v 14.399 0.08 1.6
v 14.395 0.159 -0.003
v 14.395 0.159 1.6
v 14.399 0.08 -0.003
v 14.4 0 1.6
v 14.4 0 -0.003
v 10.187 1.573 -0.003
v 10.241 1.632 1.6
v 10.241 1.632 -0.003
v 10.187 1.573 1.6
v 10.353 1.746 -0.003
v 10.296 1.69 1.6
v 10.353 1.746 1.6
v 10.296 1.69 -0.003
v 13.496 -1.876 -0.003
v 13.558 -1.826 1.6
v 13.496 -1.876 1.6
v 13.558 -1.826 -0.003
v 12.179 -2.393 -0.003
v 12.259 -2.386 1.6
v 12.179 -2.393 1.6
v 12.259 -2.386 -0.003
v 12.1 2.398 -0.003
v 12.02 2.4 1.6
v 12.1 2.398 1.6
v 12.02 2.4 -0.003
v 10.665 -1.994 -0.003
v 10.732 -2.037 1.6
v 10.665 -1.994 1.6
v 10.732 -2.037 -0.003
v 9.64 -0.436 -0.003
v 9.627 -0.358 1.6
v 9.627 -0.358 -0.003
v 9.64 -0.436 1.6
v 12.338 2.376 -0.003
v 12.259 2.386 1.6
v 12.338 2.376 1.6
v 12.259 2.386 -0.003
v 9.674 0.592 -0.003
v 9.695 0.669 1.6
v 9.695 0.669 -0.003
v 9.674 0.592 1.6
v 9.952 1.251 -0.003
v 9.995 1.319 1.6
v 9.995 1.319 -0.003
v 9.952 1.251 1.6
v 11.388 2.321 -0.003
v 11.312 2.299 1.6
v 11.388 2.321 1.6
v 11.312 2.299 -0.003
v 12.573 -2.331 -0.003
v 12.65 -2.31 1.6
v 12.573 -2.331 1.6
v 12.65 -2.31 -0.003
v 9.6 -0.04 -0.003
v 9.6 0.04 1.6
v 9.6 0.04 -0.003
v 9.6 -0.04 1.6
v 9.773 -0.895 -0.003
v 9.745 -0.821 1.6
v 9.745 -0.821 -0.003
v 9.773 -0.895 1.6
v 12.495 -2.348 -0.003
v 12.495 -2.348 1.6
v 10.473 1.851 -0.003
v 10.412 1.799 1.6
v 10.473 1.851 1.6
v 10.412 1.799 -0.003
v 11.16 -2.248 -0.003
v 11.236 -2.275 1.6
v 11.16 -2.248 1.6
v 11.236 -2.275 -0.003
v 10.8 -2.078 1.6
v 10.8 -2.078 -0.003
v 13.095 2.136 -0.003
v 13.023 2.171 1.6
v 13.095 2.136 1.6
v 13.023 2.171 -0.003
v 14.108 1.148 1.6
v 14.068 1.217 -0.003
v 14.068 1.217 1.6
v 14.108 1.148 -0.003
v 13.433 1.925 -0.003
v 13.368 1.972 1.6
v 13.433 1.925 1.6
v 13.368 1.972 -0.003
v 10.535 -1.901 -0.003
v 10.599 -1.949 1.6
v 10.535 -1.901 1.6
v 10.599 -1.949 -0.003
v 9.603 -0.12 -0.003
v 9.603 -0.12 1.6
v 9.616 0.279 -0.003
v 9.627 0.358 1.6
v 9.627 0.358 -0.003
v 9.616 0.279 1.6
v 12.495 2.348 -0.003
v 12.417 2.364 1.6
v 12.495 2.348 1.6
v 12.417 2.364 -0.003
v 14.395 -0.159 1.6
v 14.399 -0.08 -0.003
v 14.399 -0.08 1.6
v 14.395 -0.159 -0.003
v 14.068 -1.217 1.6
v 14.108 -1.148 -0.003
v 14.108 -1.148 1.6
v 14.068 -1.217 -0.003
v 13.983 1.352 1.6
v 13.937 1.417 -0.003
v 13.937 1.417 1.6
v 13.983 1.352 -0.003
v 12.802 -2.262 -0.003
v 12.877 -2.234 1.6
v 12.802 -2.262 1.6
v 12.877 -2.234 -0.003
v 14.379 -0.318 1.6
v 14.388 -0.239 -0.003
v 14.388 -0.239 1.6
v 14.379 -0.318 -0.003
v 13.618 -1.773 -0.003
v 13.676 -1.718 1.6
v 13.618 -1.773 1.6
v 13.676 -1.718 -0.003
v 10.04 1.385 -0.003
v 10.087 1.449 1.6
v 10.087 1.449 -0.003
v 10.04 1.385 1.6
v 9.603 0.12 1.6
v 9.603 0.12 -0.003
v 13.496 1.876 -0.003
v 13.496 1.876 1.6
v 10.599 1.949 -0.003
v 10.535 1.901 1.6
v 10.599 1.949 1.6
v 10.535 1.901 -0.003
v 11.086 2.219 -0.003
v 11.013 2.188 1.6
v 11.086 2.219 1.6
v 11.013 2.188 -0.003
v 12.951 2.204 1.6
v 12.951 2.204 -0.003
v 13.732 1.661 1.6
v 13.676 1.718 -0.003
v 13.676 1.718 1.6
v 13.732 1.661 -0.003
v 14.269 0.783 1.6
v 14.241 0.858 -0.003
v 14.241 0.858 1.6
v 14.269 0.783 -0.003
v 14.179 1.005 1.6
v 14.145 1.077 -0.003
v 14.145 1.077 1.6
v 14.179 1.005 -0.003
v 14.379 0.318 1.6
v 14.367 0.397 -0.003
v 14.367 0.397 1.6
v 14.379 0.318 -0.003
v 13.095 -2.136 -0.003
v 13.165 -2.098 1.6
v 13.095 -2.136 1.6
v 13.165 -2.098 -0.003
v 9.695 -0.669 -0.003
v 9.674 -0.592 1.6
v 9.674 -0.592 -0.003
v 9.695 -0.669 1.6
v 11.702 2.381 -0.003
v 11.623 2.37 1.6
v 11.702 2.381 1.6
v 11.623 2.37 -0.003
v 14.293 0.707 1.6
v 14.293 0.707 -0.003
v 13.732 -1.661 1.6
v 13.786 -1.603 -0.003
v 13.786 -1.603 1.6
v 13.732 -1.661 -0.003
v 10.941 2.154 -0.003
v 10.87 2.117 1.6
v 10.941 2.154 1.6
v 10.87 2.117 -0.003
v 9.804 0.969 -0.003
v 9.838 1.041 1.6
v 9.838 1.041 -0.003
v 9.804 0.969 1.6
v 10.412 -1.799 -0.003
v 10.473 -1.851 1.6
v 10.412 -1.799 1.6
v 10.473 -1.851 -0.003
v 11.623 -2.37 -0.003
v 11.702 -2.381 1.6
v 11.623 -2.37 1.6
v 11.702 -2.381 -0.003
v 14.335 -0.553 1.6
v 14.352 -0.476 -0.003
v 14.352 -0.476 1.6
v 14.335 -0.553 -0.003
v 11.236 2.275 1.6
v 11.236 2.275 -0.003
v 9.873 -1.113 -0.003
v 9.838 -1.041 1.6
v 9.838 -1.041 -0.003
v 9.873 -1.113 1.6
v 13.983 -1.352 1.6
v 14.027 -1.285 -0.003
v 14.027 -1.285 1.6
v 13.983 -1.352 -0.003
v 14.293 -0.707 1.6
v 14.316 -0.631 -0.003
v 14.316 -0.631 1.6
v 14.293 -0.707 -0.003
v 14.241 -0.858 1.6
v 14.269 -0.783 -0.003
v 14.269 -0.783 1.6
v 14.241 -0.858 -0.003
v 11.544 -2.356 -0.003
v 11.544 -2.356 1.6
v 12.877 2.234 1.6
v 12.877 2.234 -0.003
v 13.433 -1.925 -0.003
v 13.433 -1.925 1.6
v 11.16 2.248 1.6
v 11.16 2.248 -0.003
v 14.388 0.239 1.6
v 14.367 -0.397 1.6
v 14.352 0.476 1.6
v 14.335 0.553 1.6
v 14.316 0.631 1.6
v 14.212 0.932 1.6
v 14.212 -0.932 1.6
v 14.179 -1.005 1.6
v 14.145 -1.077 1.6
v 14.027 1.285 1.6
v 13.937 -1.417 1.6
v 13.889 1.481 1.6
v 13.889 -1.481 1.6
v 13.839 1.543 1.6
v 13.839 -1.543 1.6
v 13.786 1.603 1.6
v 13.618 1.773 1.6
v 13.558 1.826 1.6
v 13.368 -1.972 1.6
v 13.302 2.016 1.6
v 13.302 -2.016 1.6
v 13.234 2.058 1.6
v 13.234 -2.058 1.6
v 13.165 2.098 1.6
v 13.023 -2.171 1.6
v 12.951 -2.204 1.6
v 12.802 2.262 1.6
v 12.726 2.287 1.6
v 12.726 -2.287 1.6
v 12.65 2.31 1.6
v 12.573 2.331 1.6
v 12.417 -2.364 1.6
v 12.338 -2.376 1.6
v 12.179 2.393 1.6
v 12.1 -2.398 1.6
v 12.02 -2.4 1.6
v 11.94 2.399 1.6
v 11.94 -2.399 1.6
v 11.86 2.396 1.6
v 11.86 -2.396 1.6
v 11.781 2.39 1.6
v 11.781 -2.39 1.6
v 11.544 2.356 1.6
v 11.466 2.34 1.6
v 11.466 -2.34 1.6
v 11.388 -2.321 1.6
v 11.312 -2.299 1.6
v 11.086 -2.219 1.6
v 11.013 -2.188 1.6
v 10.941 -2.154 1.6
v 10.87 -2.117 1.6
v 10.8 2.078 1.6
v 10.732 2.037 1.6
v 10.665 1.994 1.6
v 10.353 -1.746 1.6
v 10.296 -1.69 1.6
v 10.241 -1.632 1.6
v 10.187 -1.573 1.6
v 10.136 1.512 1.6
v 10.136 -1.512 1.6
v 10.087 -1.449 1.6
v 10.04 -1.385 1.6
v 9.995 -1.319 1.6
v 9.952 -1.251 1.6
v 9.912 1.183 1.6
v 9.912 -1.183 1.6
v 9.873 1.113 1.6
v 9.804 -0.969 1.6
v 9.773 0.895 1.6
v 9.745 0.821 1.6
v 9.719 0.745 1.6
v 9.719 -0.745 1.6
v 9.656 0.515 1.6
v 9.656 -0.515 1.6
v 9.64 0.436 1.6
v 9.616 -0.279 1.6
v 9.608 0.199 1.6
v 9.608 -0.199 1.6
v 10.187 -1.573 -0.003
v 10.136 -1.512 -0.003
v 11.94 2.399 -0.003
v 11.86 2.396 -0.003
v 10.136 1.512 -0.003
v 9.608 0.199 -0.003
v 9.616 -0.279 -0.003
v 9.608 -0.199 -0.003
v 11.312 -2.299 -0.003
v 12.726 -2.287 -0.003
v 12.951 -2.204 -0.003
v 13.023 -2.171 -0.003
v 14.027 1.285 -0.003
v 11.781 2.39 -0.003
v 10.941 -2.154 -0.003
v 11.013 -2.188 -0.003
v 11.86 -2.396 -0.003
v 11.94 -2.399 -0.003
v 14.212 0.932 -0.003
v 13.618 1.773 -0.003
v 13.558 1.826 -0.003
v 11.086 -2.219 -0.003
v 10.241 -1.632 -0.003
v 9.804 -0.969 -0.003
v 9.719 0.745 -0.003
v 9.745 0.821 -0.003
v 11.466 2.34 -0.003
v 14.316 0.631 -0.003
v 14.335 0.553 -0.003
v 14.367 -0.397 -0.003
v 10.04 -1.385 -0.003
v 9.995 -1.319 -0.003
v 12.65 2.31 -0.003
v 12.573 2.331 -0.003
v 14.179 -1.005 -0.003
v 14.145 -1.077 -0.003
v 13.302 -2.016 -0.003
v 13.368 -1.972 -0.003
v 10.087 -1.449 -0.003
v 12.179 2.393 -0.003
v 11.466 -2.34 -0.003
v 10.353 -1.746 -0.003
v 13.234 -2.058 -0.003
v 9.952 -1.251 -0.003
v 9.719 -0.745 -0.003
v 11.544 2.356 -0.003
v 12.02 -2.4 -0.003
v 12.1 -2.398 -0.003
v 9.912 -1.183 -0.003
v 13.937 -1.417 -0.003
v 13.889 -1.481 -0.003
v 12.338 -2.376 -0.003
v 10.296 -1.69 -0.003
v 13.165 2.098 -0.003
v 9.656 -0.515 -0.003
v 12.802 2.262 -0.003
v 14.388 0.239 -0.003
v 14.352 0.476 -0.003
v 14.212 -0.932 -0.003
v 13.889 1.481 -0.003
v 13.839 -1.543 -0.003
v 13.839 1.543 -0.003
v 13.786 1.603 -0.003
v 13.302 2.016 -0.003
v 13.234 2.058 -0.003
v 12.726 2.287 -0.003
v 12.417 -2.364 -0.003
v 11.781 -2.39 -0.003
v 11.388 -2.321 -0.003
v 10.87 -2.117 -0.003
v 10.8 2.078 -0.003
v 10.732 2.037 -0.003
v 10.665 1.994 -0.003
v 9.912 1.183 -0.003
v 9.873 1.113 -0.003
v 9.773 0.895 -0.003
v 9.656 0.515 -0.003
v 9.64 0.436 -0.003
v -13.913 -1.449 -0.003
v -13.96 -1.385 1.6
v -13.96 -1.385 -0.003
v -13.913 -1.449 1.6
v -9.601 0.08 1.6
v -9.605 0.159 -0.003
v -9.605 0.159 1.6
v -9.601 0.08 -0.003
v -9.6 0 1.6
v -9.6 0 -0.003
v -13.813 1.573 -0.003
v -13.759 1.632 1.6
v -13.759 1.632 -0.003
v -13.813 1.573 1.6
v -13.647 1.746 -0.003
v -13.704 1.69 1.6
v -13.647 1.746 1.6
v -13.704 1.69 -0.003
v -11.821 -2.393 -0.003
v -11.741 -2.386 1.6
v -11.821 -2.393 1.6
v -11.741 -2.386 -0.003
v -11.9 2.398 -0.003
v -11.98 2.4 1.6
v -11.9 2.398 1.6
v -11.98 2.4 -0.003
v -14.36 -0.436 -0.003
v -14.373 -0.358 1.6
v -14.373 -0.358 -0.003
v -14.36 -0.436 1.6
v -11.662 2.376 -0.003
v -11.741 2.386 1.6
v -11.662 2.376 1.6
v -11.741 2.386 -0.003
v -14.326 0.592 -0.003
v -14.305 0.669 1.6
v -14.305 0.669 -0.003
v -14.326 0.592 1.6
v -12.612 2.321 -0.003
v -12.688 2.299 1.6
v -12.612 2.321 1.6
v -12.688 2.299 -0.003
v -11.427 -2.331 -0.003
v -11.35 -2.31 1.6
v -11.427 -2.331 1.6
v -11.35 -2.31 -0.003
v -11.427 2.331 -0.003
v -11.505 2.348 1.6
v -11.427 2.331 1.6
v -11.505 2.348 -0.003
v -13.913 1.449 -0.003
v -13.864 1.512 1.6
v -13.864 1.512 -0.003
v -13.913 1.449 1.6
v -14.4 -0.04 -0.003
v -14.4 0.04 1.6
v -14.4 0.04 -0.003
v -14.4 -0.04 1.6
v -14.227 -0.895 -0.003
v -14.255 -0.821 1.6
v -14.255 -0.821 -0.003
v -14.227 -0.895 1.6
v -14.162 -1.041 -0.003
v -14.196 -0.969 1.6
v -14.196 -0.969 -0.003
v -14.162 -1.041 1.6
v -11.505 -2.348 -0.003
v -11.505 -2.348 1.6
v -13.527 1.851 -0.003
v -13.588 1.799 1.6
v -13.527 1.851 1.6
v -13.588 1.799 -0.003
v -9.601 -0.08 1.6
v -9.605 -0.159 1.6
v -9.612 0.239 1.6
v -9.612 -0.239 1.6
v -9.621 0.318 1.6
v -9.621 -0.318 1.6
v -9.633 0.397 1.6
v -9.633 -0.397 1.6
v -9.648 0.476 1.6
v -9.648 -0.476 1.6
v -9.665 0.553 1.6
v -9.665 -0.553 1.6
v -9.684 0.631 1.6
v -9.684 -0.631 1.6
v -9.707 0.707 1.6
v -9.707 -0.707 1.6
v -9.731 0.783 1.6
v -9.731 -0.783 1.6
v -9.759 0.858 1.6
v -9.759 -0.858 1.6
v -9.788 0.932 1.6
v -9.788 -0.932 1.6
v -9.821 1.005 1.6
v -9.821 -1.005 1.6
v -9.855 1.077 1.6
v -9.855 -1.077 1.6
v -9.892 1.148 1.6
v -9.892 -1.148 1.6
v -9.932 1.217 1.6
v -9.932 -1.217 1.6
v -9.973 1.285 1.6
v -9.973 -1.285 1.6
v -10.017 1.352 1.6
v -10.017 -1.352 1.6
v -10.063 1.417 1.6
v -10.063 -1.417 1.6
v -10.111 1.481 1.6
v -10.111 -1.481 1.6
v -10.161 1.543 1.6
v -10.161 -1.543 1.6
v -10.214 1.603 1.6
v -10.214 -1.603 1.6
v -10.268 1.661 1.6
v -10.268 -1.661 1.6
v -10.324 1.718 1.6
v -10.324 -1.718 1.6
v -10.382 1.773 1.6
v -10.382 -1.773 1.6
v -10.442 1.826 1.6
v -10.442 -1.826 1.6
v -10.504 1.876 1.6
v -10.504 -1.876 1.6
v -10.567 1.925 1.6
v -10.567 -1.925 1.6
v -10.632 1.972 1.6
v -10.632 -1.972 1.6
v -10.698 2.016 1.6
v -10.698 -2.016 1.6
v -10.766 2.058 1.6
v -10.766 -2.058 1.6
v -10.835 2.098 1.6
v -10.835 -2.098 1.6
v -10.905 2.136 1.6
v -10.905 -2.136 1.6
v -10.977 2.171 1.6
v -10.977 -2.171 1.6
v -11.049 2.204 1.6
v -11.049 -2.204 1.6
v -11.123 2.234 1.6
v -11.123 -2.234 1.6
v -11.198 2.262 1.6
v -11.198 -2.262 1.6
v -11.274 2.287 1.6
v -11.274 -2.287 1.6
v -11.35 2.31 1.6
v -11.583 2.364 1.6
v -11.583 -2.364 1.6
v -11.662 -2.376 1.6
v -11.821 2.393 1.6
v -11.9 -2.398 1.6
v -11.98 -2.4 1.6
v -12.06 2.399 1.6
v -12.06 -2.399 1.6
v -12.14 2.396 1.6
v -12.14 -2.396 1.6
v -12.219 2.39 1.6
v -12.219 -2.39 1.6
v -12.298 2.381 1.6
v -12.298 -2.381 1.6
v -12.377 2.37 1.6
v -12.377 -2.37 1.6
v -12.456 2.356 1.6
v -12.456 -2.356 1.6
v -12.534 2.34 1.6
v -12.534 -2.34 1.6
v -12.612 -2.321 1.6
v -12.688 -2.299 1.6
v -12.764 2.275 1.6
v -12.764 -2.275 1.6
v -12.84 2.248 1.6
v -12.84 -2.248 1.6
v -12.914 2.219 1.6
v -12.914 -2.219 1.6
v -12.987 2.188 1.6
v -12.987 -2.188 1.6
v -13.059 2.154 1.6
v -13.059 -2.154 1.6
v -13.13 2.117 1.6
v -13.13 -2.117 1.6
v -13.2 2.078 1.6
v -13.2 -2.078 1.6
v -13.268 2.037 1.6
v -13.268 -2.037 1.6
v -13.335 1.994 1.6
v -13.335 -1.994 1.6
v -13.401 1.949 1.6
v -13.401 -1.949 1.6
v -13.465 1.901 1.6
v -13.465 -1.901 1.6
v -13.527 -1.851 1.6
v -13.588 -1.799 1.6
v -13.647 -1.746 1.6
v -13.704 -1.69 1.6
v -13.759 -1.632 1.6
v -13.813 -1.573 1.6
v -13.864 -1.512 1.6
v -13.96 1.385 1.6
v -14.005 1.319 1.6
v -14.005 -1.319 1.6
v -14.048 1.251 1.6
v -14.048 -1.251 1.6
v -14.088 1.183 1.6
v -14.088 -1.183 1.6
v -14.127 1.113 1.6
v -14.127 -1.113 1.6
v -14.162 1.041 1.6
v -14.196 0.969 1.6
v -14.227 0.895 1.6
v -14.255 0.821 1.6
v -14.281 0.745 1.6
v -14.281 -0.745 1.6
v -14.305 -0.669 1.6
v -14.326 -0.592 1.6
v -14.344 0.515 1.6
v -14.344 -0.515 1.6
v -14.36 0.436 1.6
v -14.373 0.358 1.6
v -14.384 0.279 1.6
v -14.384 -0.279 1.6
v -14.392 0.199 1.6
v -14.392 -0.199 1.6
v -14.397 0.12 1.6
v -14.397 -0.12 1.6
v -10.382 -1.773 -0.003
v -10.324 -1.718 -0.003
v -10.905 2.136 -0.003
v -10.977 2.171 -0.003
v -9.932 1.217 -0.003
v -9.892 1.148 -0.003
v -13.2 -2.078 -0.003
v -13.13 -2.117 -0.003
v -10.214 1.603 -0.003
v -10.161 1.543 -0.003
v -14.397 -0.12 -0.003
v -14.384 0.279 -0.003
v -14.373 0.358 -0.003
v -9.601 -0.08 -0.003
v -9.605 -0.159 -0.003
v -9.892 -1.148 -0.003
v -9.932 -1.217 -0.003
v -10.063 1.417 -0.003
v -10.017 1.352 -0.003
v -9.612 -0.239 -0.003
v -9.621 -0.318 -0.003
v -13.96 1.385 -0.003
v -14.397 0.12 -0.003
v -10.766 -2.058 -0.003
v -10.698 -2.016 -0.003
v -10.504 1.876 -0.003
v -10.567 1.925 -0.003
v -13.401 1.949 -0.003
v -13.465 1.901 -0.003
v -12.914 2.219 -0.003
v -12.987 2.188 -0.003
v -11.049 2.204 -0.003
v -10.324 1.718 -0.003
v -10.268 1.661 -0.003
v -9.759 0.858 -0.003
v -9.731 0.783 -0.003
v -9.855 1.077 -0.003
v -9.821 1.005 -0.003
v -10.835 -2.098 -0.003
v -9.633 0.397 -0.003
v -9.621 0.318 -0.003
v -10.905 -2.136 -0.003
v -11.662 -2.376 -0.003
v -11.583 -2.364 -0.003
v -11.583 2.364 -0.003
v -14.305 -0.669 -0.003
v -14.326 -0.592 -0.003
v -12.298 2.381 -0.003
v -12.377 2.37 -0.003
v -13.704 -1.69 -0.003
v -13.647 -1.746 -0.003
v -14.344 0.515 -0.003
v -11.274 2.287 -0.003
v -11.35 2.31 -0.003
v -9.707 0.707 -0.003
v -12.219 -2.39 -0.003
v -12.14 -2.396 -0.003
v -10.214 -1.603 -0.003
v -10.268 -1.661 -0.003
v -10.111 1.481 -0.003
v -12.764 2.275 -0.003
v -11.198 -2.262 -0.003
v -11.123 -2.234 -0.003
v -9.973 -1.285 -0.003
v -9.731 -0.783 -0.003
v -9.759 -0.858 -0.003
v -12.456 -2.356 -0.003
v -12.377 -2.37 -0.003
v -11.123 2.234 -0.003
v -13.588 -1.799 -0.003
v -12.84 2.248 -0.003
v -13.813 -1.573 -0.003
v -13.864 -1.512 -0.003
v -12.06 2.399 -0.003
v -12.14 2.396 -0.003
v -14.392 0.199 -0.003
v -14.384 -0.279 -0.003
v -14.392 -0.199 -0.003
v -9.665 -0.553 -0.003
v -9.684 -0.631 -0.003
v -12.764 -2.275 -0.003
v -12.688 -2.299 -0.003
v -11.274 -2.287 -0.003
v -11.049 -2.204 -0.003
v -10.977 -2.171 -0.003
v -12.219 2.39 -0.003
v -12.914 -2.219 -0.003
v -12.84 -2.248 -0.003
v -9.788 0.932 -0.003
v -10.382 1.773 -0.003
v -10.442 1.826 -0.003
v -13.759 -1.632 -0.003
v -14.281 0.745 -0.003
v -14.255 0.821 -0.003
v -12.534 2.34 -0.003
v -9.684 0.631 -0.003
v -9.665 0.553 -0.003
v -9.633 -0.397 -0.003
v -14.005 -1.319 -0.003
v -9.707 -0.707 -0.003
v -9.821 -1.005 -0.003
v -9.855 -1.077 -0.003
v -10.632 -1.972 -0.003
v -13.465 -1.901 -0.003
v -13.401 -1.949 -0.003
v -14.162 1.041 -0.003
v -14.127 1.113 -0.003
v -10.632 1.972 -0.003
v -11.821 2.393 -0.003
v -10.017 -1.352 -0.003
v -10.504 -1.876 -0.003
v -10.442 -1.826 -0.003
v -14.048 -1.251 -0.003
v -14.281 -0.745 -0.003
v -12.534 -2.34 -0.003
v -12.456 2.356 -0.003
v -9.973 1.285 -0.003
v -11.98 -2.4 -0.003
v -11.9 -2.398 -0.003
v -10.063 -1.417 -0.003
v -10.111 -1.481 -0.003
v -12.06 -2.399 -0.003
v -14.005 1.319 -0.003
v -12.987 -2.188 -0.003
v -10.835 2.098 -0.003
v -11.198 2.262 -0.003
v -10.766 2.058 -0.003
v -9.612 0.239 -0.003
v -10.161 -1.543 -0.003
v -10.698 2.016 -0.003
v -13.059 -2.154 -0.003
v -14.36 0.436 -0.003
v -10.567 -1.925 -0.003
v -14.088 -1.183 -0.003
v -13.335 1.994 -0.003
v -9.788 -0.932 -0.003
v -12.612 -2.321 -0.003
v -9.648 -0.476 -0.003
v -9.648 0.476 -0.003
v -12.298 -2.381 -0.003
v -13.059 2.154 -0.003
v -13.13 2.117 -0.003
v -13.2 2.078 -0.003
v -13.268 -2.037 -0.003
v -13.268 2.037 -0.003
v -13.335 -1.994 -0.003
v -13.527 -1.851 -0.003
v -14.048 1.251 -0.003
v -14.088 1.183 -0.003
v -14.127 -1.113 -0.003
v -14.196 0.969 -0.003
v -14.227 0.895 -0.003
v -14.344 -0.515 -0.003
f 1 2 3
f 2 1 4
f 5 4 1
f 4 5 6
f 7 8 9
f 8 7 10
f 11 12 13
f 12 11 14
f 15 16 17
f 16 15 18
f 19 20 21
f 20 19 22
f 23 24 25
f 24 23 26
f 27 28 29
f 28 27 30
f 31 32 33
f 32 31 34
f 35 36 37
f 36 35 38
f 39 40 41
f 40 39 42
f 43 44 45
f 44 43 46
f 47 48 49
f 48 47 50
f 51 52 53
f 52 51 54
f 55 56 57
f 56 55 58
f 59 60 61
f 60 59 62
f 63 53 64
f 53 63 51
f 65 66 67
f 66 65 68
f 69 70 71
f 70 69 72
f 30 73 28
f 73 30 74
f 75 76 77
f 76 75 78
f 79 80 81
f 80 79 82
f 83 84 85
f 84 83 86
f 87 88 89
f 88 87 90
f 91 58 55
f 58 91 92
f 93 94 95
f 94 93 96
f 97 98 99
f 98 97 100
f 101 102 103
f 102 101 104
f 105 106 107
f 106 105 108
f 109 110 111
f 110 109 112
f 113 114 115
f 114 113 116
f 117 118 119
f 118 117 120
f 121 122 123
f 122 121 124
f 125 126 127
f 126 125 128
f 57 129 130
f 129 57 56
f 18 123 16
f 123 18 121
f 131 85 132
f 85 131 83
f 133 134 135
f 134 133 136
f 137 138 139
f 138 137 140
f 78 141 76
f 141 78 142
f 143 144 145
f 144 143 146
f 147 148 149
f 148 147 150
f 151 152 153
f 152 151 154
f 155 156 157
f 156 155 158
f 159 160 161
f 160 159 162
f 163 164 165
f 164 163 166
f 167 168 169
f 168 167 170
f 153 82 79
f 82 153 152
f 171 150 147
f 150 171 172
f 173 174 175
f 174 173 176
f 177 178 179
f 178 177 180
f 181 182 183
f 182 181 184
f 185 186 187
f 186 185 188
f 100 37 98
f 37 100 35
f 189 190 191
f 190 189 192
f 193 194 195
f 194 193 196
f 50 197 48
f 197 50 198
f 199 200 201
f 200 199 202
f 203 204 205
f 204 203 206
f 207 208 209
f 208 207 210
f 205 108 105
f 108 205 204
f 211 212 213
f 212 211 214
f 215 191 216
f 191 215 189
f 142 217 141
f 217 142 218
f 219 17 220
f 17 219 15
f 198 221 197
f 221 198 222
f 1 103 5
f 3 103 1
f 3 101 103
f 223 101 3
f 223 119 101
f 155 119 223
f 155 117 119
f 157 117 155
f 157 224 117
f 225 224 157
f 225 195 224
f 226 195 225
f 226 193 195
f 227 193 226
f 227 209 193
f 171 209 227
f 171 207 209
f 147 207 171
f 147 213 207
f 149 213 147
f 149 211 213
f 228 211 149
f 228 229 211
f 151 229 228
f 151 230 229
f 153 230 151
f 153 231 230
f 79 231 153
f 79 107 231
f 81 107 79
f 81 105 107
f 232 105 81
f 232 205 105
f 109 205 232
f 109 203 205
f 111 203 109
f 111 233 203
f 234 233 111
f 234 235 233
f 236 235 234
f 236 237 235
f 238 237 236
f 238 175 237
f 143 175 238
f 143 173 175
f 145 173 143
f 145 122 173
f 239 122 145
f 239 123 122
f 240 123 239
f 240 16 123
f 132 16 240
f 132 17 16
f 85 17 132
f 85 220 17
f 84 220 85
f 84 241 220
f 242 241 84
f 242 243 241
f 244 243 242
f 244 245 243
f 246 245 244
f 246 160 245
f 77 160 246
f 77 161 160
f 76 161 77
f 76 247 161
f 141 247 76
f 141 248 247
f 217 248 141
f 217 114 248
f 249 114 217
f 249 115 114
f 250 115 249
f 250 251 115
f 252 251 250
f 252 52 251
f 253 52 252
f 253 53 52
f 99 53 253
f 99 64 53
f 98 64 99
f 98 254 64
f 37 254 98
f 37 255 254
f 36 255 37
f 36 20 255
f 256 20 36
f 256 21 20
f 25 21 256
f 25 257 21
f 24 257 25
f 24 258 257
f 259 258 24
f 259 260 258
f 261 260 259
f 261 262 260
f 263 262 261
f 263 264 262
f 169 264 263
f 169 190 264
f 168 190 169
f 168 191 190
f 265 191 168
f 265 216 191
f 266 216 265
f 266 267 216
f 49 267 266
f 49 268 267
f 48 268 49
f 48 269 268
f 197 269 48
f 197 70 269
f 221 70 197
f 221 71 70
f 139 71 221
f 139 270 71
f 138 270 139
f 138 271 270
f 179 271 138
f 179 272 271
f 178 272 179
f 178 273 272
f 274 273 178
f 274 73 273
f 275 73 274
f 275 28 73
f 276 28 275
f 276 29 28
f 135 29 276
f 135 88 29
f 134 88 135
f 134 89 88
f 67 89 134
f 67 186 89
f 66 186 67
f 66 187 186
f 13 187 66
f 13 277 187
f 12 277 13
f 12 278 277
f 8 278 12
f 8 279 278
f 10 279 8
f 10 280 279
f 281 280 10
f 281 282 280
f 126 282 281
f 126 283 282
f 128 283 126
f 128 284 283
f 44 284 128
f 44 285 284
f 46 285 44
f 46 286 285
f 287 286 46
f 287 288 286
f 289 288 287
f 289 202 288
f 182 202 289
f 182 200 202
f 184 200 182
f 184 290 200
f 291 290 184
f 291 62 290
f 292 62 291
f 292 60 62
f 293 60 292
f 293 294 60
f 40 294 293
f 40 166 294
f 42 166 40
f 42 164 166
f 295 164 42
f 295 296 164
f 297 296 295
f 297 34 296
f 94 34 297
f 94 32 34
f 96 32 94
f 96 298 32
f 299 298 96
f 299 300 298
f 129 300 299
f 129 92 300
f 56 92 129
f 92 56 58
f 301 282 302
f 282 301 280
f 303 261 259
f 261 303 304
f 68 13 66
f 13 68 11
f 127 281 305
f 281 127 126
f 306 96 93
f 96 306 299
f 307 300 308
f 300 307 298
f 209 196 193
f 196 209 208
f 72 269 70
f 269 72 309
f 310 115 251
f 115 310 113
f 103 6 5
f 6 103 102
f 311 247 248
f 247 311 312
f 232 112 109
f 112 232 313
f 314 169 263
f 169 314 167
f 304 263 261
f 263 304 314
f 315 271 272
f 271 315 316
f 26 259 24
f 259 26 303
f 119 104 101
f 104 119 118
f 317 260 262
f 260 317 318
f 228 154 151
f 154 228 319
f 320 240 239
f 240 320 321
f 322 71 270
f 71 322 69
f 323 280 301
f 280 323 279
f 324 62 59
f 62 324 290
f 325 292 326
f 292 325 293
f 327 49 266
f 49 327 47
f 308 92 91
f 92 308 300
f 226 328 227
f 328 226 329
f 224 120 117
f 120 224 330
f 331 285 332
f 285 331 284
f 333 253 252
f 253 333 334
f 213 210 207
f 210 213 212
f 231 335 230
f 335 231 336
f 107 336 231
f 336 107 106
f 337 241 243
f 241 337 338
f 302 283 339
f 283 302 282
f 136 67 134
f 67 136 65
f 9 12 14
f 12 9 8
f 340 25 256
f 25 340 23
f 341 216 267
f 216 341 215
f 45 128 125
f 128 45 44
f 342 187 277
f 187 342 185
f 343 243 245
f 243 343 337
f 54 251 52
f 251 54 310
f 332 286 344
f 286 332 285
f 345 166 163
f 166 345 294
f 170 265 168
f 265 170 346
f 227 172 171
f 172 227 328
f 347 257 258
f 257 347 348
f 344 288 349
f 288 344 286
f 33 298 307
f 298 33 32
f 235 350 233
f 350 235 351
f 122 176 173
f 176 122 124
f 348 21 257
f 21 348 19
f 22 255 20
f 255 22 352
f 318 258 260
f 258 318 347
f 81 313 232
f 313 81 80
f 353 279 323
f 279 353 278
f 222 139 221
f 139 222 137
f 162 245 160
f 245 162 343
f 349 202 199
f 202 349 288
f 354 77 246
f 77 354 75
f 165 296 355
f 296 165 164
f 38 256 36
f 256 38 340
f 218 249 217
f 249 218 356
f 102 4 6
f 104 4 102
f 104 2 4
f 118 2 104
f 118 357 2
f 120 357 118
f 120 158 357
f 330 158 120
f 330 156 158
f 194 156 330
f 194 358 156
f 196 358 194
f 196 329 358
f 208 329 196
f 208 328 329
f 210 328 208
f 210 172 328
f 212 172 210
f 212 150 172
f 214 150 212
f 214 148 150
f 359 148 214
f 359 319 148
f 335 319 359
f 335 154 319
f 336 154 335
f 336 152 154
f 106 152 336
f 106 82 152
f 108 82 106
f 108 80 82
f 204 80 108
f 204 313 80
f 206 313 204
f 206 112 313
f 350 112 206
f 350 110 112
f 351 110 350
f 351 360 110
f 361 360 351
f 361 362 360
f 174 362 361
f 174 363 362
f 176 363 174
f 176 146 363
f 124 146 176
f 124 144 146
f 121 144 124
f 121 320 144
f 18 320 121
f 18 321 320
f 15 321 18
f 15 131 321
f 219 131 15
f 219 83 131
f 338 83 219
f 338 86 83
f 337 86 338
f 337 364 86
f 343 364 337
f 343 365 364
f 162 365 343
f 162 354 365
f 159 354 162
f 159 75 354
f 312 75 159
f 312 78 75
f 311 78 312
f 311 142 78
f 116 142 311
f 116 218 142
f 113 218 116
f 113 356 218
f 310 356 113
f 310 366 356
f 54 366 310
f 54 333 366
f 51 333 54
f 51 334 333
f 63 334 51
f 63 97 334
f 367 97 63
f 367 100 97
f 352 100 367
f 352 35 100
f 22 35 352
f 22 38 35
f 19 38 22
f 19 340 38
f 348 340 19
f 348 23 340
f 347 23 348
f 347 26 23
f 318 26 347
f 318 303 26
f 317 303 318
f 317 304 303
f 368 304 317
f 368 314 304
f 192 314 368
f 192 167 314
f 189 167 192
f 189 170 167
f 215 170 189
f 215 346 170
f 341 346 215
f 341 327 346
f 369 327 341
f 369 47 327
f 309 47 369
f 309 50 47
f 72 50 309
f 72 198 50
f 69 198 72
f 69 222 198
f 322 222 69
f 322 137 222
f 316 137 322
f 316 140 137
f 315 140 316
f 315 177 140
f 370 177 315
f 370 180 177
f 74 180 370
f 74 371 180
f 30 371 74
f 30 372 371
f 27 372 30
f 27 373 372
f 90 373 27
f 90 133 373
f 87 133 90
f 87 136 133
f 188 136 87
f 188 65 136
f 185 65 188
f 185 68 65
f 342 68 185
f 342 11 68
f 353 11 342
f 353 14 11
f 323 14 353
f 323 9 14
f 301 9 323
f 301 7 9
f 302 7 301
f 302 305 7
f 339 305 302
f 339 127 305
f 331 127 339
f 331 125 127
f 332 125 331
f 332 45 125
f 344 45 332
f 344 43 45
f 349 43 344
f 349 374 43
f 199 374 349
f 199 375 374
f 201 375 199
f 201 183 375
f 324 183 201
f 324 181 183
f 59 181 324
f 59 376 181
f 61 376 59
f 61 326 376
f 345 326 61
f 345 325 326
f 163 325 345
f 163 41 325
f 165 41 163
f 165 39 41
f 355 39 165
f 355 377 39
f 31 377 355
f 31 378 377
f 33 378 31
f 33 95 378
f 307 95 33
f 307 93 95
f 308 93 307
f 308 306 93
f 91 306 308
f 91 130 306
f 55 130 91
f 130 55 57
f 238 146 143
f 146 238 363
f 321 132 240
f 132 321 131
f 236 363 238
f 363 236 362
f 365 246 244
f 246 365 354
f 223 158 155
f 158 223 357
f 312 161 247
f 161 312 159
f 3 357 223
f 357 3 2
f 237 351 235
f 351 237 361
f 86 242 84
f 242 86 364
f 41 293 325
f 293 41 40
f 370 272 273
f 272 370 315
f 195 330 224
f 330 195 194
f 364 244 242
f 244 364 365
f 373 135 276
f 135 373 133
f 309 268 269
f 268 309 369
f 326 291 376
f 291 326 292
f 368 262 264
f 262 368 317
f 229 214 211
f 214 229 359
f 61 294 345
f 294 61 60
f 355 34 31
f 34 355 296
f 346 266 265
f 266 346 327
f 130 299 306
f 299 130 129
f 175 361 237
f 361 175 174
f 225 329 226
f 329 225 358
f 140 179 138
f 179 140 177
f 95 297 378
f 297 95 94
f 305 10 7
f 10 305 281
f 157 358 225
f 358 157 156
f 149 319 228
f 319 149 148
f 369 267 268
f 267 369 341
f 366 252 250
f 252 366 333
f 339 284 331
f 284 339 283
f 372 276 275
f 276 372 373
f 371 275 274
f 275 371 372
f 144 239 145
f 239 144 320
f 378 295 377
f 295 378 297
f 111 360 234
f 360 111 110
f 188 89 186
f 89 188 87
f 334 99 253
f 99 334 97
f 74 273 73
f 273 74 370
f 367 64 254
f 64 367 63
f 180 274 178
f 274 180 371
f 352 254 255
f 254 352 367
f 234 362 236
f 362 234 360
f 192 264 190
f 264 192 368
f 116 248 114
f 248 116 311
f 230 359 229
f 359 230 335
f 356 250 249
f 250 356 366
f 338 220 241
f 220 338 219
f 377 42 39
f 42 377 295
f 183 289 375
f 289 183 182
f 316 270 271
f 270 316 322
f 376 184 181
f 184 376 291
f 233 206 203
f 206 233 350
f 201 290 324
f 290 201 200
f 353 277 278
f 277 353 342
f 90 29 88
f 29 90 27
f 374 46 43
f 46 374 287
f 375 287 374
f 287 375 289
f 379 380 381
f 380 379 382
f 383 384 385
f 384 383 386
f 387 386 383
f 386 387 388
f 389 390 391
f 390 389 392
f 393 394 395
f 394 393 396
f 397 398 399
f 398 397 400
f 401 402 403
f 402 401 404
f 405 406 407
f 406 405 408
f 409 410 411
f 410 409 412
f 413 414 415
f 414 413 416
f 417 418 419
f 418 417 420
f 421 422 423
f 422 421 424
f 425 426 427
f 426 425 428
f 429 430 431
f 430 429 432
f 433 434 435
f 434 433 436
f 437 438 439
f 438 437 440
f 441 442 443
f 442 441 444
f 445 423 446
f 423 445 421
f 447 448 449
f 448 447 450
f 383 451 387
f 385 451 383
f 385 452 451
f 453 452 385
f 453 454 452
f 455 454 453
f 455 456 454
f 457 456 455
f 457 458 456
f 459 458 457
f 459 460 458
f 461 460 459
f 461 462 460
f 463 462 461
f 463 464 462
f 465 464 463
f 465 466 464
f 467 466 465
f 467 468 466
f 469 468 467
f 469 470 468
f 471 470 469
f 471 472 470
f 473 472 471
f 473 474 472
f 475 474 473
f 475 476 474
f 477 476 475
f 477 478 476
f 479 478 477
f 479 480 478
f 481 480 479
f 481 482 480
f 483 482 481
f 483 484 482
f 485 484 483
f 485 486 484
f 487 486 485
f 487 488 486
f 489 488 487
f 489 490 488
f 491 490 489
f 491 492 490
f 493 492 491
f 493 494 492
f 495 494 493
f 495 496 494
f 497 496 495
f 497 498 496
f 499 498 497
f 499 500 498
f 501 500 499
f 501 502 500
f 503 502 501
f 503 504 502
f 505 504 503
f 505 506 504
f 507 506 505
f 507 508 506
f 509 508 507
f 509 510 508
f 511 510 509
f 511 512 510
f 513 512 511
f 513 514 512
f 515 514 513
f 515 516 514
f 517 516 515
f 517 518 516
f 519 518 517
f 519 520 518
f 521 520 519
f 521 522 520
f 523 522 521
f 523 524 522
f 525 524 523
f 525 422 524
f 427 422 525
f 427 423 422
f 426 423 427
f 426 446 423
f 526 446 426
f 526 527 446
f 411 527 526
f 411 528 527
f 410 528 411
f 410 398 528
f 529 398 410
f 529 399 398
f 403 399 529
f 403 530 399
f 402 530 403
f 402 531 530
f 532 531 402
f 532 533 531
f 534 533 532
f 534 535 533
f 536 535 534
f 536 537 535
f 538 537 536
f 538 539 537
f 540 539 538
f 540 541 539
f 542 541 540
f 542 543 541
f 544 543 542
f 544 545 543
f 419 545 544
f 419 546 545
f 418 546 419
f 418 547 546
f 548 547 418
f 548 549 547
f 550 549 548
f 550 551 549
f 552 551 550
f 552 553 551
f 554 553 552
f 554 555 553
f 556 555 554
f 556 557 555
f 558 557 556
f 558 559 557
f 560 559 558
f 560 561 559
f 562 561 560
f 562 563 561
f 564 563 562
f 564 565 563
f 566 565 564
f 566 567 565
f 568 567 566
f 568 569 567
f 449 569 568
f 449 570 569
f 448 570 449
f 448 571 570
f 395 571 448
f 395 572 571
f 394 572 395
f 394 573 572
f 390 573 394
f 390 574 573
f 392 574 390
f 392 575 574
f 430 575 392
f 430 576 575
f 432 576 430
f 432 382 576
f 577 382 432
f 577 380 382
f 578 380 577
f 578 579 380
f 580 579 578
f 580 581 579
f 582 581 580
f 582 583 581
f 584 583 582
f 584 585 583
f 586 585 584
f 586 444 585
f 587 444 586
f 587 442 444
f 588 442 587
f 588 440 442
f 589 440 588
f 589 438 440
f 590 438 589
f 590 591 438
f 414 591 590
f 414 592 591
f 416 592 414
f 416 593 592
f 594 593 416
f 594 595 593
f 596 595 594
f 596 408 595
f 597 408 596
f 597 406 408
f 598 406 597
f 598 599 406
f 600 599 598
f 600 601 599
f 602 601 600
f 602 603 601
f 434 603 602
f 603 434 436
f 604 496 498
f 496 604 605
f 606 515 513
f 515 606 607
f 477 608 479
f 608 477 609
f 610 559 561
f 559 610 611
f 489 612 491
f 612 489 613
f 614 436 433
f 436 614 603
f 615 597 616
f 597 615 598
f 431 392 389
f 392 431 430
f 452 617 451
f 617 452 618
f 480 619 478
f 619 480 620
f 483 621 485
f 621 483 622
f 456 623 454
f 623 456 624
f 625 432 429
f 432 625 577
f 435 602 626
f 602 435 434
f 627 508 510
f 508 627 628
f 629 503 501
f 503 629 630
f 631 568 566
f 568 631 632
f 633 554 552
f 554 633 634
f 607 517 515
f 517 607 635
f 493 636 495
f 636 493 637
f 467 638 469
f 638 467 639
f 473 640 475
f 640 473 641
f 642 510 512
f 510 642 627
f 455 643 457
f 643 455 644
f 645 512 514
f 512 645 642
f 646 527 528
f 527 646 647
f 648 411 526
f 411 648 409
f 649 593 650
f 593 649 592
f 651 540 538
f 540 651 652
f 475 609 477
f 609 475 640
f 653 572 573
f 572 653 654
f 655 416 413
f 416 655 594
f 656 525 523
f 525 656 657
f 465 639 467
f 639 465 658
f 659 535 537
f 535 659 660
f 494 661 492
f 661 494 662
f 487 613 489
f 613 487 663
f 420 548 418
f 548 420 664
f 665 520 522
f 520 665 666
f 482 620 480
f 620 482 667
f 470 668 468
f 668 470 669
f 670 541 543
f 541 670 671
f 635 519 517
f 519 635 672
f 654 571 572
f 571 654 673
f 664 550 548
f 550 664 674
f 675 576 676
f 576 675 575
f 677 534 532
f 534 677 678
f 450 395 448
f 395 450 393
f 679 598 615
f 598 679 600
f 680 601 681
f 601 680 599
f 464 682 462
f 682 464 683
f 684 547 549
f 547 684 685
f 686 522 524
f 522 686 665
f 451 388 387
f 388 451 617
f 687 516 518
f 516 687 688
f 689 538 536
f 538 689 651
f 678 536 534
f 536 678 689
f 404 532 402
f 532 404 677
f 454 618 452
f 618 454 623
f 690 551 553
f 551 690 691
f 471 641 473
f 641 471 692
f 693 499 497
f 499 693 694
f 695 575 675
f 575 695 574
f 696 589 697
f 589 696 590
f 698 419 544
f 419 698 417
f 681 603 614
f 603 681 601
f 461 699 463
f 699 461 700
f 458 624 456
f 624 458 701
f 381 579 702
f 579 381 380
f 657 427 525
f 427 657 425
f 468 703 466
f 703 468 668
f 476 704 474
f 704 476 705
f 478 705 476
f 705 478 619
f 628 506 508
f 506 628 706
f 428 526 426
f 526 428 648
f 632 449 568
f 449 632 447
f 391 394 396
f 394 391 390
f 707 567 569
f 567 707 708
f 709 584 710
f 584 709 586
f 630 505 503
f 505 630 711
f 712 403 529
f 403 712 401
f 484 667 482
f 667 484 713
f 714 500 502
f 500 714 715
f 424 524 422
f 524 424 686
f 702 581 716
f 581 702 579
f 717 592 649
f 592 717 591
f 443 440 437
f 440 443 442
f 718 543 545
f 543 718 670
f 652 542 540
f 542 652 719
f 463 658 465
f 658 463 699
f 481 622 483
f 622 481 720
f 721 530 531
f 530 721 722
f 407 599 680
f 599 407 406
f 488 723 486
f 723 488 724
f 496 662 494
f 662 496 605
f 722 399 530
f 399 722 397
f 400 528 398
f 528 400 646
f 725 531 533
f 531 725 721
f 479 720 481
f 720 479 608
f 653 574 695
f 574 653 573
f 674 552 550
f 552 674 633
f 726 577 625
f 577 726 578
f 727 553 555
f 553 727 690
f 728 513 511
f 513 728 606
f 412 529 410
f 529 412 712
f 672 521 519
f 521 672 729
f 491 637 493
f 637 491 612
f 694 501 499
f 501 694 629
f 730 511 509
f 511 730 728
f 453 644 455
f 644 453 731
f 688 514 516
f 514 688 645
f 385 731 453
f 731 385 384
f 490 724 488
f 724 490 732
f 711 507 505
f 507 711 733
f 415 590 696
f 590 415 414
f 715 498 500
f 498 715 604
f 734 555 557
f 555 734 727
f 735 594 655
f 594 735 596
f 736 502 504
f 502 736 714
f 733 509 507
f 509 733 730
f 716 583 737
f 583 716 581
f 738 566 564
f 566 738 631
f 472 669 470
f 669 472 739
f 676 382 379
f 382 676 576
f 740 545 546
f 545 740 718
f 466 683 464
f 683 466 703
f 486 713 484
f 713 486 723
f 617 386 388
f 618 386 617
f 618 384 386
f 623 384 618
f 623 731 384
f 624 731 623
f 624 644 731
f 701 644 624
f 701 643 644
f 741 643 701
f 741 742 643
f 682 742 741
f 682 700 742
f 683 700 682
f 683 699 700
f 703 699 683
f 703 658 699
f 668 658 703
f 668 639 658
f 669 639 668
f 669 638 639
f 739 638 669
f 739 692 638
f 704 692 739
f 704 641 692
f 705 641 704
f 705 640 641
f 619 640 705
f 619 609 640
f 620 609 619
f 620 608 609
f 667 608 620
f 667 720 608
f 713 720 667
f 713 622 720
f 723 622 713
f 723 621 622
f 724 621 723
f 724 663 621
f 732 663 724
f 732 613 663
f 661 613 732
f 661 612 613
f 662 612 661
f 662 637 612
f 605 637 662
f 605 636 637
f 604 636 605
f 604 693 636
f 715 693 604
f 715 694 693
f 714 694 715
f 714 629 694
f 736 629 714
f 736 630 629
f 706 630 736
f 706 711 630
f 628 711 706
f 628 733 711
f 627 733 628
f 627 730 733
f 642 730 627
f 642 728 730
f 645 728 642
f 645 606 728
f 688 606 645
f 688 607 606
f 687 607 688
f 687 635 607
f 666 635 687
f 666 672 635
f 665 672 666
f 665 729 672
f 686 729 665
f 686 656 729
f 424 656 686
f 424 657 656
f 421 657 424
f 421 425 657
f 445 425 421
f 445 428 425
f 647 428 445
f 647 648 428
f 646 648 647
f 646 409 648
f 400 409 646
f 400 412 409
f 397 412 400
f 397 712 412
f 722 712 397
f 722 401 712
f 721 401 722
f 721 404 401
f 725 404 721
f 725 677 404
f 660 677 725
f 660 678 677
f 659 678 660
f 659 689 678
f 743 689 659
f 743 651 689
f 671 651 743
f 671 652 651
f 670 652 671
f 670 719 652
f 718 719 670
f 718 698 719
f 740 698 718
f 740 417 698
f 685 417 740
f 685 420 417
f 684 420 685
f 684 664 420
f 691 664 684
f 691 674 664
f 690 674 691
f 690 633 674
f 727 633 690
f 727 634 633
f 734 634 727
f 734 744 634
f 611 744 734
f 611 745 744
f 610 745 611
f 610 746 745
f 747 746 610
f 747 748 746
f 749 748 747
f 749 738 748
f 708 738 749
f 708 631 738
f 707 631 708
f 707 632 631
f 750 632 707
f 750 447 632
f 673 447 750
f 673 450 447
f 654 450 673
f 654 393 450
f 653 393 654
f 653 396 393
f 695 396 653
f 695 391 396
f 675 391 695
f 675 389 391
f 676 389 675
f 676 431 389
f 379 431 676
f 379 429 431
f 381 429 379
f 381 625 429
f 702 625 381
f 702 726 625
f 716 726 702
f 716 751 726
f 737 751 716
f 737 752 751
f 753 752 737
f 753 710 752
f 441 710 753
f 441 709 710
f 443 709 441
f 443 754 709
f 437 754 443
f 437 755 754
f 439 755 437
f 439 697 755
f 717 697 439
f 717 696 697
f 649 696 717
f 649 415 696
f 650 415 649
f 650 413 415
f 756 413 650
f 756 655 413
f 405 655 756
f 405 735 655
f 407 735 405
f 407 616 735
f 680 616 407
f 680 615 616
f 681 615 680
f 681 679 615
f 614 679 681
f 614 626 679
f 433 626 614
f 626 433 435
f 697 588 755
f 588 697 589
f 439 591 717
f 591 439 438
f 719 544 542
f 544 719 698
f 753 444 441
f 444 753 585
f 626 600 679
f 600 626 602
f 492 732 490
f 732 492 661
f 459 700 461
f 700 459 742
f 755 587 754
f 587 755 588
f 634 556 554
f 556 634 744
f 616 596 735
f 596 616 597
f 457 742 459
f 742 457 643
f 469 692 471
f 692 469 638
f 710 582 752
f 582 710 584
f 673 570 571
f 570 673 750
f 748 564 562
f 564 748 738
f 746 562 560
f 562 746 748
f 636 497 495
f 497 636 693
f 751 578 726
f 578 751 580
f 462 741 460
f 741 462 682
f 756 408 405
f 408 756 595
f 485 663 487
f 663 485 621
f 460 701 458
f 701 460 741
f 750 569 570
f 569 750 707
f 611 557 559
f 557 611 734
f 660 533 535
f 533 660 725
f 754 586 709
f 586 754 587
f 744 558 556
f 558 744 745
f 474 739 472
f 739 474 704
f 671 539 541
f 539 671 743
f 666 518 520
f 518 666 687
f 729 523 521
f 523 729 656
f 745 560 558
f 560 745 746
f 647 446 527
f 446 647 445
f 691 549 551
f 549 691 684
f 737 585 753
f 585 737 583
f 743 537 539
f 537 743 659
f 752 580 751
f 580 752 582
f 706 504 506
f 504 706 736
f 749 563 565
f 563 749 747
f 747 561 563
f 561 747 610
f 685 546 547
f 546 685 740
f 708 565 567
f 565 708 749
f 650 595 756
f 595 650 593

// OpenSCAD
use <../lib.scad>
use <93348.scad>
$fa=1; $fs=0.2;
function ldraw_lib__u9046(realsolid=false) = [
// 0 ~Moved to 93348
// 0 Name: u9046.dat
// 0 Author: [PTadmin]
// 0 !LDRAW_ORG Part UPDATE 2013-02
// 0 !LICENSE Licensed under CC BY 4.0 : see CAreadme.txt
// 
// 0 BFC CERTIFY CCW
  [0,"BFC","CERTIFY"],
  [0,"BFC","CCW"],
// 
// 0 !HISTORY 2013-12-23 [PTadmin] Official Update 2013-02
// 
// 
// 0 // Wedge 4 x 4 with Stud Notches
// 1 16 0 0 0 1 0 0 0 1 0 0 0 1 93348.dat
  [1,16,0,0,0,1,0,0,0,1,0,0,0,1, ldraw_lib__93348(realsolid)],
];
module ldraw_lib__u9046(step=0, col=false, unit=2/5, alt=false, line=0.2, solid=!$preview)
    makepoly(ldraw_lib__u9046(solid), step=step, col=col, unit=unit, alt=alt, line=line, solid=solid);
ldraw_lib__u9046(line=0.2);
